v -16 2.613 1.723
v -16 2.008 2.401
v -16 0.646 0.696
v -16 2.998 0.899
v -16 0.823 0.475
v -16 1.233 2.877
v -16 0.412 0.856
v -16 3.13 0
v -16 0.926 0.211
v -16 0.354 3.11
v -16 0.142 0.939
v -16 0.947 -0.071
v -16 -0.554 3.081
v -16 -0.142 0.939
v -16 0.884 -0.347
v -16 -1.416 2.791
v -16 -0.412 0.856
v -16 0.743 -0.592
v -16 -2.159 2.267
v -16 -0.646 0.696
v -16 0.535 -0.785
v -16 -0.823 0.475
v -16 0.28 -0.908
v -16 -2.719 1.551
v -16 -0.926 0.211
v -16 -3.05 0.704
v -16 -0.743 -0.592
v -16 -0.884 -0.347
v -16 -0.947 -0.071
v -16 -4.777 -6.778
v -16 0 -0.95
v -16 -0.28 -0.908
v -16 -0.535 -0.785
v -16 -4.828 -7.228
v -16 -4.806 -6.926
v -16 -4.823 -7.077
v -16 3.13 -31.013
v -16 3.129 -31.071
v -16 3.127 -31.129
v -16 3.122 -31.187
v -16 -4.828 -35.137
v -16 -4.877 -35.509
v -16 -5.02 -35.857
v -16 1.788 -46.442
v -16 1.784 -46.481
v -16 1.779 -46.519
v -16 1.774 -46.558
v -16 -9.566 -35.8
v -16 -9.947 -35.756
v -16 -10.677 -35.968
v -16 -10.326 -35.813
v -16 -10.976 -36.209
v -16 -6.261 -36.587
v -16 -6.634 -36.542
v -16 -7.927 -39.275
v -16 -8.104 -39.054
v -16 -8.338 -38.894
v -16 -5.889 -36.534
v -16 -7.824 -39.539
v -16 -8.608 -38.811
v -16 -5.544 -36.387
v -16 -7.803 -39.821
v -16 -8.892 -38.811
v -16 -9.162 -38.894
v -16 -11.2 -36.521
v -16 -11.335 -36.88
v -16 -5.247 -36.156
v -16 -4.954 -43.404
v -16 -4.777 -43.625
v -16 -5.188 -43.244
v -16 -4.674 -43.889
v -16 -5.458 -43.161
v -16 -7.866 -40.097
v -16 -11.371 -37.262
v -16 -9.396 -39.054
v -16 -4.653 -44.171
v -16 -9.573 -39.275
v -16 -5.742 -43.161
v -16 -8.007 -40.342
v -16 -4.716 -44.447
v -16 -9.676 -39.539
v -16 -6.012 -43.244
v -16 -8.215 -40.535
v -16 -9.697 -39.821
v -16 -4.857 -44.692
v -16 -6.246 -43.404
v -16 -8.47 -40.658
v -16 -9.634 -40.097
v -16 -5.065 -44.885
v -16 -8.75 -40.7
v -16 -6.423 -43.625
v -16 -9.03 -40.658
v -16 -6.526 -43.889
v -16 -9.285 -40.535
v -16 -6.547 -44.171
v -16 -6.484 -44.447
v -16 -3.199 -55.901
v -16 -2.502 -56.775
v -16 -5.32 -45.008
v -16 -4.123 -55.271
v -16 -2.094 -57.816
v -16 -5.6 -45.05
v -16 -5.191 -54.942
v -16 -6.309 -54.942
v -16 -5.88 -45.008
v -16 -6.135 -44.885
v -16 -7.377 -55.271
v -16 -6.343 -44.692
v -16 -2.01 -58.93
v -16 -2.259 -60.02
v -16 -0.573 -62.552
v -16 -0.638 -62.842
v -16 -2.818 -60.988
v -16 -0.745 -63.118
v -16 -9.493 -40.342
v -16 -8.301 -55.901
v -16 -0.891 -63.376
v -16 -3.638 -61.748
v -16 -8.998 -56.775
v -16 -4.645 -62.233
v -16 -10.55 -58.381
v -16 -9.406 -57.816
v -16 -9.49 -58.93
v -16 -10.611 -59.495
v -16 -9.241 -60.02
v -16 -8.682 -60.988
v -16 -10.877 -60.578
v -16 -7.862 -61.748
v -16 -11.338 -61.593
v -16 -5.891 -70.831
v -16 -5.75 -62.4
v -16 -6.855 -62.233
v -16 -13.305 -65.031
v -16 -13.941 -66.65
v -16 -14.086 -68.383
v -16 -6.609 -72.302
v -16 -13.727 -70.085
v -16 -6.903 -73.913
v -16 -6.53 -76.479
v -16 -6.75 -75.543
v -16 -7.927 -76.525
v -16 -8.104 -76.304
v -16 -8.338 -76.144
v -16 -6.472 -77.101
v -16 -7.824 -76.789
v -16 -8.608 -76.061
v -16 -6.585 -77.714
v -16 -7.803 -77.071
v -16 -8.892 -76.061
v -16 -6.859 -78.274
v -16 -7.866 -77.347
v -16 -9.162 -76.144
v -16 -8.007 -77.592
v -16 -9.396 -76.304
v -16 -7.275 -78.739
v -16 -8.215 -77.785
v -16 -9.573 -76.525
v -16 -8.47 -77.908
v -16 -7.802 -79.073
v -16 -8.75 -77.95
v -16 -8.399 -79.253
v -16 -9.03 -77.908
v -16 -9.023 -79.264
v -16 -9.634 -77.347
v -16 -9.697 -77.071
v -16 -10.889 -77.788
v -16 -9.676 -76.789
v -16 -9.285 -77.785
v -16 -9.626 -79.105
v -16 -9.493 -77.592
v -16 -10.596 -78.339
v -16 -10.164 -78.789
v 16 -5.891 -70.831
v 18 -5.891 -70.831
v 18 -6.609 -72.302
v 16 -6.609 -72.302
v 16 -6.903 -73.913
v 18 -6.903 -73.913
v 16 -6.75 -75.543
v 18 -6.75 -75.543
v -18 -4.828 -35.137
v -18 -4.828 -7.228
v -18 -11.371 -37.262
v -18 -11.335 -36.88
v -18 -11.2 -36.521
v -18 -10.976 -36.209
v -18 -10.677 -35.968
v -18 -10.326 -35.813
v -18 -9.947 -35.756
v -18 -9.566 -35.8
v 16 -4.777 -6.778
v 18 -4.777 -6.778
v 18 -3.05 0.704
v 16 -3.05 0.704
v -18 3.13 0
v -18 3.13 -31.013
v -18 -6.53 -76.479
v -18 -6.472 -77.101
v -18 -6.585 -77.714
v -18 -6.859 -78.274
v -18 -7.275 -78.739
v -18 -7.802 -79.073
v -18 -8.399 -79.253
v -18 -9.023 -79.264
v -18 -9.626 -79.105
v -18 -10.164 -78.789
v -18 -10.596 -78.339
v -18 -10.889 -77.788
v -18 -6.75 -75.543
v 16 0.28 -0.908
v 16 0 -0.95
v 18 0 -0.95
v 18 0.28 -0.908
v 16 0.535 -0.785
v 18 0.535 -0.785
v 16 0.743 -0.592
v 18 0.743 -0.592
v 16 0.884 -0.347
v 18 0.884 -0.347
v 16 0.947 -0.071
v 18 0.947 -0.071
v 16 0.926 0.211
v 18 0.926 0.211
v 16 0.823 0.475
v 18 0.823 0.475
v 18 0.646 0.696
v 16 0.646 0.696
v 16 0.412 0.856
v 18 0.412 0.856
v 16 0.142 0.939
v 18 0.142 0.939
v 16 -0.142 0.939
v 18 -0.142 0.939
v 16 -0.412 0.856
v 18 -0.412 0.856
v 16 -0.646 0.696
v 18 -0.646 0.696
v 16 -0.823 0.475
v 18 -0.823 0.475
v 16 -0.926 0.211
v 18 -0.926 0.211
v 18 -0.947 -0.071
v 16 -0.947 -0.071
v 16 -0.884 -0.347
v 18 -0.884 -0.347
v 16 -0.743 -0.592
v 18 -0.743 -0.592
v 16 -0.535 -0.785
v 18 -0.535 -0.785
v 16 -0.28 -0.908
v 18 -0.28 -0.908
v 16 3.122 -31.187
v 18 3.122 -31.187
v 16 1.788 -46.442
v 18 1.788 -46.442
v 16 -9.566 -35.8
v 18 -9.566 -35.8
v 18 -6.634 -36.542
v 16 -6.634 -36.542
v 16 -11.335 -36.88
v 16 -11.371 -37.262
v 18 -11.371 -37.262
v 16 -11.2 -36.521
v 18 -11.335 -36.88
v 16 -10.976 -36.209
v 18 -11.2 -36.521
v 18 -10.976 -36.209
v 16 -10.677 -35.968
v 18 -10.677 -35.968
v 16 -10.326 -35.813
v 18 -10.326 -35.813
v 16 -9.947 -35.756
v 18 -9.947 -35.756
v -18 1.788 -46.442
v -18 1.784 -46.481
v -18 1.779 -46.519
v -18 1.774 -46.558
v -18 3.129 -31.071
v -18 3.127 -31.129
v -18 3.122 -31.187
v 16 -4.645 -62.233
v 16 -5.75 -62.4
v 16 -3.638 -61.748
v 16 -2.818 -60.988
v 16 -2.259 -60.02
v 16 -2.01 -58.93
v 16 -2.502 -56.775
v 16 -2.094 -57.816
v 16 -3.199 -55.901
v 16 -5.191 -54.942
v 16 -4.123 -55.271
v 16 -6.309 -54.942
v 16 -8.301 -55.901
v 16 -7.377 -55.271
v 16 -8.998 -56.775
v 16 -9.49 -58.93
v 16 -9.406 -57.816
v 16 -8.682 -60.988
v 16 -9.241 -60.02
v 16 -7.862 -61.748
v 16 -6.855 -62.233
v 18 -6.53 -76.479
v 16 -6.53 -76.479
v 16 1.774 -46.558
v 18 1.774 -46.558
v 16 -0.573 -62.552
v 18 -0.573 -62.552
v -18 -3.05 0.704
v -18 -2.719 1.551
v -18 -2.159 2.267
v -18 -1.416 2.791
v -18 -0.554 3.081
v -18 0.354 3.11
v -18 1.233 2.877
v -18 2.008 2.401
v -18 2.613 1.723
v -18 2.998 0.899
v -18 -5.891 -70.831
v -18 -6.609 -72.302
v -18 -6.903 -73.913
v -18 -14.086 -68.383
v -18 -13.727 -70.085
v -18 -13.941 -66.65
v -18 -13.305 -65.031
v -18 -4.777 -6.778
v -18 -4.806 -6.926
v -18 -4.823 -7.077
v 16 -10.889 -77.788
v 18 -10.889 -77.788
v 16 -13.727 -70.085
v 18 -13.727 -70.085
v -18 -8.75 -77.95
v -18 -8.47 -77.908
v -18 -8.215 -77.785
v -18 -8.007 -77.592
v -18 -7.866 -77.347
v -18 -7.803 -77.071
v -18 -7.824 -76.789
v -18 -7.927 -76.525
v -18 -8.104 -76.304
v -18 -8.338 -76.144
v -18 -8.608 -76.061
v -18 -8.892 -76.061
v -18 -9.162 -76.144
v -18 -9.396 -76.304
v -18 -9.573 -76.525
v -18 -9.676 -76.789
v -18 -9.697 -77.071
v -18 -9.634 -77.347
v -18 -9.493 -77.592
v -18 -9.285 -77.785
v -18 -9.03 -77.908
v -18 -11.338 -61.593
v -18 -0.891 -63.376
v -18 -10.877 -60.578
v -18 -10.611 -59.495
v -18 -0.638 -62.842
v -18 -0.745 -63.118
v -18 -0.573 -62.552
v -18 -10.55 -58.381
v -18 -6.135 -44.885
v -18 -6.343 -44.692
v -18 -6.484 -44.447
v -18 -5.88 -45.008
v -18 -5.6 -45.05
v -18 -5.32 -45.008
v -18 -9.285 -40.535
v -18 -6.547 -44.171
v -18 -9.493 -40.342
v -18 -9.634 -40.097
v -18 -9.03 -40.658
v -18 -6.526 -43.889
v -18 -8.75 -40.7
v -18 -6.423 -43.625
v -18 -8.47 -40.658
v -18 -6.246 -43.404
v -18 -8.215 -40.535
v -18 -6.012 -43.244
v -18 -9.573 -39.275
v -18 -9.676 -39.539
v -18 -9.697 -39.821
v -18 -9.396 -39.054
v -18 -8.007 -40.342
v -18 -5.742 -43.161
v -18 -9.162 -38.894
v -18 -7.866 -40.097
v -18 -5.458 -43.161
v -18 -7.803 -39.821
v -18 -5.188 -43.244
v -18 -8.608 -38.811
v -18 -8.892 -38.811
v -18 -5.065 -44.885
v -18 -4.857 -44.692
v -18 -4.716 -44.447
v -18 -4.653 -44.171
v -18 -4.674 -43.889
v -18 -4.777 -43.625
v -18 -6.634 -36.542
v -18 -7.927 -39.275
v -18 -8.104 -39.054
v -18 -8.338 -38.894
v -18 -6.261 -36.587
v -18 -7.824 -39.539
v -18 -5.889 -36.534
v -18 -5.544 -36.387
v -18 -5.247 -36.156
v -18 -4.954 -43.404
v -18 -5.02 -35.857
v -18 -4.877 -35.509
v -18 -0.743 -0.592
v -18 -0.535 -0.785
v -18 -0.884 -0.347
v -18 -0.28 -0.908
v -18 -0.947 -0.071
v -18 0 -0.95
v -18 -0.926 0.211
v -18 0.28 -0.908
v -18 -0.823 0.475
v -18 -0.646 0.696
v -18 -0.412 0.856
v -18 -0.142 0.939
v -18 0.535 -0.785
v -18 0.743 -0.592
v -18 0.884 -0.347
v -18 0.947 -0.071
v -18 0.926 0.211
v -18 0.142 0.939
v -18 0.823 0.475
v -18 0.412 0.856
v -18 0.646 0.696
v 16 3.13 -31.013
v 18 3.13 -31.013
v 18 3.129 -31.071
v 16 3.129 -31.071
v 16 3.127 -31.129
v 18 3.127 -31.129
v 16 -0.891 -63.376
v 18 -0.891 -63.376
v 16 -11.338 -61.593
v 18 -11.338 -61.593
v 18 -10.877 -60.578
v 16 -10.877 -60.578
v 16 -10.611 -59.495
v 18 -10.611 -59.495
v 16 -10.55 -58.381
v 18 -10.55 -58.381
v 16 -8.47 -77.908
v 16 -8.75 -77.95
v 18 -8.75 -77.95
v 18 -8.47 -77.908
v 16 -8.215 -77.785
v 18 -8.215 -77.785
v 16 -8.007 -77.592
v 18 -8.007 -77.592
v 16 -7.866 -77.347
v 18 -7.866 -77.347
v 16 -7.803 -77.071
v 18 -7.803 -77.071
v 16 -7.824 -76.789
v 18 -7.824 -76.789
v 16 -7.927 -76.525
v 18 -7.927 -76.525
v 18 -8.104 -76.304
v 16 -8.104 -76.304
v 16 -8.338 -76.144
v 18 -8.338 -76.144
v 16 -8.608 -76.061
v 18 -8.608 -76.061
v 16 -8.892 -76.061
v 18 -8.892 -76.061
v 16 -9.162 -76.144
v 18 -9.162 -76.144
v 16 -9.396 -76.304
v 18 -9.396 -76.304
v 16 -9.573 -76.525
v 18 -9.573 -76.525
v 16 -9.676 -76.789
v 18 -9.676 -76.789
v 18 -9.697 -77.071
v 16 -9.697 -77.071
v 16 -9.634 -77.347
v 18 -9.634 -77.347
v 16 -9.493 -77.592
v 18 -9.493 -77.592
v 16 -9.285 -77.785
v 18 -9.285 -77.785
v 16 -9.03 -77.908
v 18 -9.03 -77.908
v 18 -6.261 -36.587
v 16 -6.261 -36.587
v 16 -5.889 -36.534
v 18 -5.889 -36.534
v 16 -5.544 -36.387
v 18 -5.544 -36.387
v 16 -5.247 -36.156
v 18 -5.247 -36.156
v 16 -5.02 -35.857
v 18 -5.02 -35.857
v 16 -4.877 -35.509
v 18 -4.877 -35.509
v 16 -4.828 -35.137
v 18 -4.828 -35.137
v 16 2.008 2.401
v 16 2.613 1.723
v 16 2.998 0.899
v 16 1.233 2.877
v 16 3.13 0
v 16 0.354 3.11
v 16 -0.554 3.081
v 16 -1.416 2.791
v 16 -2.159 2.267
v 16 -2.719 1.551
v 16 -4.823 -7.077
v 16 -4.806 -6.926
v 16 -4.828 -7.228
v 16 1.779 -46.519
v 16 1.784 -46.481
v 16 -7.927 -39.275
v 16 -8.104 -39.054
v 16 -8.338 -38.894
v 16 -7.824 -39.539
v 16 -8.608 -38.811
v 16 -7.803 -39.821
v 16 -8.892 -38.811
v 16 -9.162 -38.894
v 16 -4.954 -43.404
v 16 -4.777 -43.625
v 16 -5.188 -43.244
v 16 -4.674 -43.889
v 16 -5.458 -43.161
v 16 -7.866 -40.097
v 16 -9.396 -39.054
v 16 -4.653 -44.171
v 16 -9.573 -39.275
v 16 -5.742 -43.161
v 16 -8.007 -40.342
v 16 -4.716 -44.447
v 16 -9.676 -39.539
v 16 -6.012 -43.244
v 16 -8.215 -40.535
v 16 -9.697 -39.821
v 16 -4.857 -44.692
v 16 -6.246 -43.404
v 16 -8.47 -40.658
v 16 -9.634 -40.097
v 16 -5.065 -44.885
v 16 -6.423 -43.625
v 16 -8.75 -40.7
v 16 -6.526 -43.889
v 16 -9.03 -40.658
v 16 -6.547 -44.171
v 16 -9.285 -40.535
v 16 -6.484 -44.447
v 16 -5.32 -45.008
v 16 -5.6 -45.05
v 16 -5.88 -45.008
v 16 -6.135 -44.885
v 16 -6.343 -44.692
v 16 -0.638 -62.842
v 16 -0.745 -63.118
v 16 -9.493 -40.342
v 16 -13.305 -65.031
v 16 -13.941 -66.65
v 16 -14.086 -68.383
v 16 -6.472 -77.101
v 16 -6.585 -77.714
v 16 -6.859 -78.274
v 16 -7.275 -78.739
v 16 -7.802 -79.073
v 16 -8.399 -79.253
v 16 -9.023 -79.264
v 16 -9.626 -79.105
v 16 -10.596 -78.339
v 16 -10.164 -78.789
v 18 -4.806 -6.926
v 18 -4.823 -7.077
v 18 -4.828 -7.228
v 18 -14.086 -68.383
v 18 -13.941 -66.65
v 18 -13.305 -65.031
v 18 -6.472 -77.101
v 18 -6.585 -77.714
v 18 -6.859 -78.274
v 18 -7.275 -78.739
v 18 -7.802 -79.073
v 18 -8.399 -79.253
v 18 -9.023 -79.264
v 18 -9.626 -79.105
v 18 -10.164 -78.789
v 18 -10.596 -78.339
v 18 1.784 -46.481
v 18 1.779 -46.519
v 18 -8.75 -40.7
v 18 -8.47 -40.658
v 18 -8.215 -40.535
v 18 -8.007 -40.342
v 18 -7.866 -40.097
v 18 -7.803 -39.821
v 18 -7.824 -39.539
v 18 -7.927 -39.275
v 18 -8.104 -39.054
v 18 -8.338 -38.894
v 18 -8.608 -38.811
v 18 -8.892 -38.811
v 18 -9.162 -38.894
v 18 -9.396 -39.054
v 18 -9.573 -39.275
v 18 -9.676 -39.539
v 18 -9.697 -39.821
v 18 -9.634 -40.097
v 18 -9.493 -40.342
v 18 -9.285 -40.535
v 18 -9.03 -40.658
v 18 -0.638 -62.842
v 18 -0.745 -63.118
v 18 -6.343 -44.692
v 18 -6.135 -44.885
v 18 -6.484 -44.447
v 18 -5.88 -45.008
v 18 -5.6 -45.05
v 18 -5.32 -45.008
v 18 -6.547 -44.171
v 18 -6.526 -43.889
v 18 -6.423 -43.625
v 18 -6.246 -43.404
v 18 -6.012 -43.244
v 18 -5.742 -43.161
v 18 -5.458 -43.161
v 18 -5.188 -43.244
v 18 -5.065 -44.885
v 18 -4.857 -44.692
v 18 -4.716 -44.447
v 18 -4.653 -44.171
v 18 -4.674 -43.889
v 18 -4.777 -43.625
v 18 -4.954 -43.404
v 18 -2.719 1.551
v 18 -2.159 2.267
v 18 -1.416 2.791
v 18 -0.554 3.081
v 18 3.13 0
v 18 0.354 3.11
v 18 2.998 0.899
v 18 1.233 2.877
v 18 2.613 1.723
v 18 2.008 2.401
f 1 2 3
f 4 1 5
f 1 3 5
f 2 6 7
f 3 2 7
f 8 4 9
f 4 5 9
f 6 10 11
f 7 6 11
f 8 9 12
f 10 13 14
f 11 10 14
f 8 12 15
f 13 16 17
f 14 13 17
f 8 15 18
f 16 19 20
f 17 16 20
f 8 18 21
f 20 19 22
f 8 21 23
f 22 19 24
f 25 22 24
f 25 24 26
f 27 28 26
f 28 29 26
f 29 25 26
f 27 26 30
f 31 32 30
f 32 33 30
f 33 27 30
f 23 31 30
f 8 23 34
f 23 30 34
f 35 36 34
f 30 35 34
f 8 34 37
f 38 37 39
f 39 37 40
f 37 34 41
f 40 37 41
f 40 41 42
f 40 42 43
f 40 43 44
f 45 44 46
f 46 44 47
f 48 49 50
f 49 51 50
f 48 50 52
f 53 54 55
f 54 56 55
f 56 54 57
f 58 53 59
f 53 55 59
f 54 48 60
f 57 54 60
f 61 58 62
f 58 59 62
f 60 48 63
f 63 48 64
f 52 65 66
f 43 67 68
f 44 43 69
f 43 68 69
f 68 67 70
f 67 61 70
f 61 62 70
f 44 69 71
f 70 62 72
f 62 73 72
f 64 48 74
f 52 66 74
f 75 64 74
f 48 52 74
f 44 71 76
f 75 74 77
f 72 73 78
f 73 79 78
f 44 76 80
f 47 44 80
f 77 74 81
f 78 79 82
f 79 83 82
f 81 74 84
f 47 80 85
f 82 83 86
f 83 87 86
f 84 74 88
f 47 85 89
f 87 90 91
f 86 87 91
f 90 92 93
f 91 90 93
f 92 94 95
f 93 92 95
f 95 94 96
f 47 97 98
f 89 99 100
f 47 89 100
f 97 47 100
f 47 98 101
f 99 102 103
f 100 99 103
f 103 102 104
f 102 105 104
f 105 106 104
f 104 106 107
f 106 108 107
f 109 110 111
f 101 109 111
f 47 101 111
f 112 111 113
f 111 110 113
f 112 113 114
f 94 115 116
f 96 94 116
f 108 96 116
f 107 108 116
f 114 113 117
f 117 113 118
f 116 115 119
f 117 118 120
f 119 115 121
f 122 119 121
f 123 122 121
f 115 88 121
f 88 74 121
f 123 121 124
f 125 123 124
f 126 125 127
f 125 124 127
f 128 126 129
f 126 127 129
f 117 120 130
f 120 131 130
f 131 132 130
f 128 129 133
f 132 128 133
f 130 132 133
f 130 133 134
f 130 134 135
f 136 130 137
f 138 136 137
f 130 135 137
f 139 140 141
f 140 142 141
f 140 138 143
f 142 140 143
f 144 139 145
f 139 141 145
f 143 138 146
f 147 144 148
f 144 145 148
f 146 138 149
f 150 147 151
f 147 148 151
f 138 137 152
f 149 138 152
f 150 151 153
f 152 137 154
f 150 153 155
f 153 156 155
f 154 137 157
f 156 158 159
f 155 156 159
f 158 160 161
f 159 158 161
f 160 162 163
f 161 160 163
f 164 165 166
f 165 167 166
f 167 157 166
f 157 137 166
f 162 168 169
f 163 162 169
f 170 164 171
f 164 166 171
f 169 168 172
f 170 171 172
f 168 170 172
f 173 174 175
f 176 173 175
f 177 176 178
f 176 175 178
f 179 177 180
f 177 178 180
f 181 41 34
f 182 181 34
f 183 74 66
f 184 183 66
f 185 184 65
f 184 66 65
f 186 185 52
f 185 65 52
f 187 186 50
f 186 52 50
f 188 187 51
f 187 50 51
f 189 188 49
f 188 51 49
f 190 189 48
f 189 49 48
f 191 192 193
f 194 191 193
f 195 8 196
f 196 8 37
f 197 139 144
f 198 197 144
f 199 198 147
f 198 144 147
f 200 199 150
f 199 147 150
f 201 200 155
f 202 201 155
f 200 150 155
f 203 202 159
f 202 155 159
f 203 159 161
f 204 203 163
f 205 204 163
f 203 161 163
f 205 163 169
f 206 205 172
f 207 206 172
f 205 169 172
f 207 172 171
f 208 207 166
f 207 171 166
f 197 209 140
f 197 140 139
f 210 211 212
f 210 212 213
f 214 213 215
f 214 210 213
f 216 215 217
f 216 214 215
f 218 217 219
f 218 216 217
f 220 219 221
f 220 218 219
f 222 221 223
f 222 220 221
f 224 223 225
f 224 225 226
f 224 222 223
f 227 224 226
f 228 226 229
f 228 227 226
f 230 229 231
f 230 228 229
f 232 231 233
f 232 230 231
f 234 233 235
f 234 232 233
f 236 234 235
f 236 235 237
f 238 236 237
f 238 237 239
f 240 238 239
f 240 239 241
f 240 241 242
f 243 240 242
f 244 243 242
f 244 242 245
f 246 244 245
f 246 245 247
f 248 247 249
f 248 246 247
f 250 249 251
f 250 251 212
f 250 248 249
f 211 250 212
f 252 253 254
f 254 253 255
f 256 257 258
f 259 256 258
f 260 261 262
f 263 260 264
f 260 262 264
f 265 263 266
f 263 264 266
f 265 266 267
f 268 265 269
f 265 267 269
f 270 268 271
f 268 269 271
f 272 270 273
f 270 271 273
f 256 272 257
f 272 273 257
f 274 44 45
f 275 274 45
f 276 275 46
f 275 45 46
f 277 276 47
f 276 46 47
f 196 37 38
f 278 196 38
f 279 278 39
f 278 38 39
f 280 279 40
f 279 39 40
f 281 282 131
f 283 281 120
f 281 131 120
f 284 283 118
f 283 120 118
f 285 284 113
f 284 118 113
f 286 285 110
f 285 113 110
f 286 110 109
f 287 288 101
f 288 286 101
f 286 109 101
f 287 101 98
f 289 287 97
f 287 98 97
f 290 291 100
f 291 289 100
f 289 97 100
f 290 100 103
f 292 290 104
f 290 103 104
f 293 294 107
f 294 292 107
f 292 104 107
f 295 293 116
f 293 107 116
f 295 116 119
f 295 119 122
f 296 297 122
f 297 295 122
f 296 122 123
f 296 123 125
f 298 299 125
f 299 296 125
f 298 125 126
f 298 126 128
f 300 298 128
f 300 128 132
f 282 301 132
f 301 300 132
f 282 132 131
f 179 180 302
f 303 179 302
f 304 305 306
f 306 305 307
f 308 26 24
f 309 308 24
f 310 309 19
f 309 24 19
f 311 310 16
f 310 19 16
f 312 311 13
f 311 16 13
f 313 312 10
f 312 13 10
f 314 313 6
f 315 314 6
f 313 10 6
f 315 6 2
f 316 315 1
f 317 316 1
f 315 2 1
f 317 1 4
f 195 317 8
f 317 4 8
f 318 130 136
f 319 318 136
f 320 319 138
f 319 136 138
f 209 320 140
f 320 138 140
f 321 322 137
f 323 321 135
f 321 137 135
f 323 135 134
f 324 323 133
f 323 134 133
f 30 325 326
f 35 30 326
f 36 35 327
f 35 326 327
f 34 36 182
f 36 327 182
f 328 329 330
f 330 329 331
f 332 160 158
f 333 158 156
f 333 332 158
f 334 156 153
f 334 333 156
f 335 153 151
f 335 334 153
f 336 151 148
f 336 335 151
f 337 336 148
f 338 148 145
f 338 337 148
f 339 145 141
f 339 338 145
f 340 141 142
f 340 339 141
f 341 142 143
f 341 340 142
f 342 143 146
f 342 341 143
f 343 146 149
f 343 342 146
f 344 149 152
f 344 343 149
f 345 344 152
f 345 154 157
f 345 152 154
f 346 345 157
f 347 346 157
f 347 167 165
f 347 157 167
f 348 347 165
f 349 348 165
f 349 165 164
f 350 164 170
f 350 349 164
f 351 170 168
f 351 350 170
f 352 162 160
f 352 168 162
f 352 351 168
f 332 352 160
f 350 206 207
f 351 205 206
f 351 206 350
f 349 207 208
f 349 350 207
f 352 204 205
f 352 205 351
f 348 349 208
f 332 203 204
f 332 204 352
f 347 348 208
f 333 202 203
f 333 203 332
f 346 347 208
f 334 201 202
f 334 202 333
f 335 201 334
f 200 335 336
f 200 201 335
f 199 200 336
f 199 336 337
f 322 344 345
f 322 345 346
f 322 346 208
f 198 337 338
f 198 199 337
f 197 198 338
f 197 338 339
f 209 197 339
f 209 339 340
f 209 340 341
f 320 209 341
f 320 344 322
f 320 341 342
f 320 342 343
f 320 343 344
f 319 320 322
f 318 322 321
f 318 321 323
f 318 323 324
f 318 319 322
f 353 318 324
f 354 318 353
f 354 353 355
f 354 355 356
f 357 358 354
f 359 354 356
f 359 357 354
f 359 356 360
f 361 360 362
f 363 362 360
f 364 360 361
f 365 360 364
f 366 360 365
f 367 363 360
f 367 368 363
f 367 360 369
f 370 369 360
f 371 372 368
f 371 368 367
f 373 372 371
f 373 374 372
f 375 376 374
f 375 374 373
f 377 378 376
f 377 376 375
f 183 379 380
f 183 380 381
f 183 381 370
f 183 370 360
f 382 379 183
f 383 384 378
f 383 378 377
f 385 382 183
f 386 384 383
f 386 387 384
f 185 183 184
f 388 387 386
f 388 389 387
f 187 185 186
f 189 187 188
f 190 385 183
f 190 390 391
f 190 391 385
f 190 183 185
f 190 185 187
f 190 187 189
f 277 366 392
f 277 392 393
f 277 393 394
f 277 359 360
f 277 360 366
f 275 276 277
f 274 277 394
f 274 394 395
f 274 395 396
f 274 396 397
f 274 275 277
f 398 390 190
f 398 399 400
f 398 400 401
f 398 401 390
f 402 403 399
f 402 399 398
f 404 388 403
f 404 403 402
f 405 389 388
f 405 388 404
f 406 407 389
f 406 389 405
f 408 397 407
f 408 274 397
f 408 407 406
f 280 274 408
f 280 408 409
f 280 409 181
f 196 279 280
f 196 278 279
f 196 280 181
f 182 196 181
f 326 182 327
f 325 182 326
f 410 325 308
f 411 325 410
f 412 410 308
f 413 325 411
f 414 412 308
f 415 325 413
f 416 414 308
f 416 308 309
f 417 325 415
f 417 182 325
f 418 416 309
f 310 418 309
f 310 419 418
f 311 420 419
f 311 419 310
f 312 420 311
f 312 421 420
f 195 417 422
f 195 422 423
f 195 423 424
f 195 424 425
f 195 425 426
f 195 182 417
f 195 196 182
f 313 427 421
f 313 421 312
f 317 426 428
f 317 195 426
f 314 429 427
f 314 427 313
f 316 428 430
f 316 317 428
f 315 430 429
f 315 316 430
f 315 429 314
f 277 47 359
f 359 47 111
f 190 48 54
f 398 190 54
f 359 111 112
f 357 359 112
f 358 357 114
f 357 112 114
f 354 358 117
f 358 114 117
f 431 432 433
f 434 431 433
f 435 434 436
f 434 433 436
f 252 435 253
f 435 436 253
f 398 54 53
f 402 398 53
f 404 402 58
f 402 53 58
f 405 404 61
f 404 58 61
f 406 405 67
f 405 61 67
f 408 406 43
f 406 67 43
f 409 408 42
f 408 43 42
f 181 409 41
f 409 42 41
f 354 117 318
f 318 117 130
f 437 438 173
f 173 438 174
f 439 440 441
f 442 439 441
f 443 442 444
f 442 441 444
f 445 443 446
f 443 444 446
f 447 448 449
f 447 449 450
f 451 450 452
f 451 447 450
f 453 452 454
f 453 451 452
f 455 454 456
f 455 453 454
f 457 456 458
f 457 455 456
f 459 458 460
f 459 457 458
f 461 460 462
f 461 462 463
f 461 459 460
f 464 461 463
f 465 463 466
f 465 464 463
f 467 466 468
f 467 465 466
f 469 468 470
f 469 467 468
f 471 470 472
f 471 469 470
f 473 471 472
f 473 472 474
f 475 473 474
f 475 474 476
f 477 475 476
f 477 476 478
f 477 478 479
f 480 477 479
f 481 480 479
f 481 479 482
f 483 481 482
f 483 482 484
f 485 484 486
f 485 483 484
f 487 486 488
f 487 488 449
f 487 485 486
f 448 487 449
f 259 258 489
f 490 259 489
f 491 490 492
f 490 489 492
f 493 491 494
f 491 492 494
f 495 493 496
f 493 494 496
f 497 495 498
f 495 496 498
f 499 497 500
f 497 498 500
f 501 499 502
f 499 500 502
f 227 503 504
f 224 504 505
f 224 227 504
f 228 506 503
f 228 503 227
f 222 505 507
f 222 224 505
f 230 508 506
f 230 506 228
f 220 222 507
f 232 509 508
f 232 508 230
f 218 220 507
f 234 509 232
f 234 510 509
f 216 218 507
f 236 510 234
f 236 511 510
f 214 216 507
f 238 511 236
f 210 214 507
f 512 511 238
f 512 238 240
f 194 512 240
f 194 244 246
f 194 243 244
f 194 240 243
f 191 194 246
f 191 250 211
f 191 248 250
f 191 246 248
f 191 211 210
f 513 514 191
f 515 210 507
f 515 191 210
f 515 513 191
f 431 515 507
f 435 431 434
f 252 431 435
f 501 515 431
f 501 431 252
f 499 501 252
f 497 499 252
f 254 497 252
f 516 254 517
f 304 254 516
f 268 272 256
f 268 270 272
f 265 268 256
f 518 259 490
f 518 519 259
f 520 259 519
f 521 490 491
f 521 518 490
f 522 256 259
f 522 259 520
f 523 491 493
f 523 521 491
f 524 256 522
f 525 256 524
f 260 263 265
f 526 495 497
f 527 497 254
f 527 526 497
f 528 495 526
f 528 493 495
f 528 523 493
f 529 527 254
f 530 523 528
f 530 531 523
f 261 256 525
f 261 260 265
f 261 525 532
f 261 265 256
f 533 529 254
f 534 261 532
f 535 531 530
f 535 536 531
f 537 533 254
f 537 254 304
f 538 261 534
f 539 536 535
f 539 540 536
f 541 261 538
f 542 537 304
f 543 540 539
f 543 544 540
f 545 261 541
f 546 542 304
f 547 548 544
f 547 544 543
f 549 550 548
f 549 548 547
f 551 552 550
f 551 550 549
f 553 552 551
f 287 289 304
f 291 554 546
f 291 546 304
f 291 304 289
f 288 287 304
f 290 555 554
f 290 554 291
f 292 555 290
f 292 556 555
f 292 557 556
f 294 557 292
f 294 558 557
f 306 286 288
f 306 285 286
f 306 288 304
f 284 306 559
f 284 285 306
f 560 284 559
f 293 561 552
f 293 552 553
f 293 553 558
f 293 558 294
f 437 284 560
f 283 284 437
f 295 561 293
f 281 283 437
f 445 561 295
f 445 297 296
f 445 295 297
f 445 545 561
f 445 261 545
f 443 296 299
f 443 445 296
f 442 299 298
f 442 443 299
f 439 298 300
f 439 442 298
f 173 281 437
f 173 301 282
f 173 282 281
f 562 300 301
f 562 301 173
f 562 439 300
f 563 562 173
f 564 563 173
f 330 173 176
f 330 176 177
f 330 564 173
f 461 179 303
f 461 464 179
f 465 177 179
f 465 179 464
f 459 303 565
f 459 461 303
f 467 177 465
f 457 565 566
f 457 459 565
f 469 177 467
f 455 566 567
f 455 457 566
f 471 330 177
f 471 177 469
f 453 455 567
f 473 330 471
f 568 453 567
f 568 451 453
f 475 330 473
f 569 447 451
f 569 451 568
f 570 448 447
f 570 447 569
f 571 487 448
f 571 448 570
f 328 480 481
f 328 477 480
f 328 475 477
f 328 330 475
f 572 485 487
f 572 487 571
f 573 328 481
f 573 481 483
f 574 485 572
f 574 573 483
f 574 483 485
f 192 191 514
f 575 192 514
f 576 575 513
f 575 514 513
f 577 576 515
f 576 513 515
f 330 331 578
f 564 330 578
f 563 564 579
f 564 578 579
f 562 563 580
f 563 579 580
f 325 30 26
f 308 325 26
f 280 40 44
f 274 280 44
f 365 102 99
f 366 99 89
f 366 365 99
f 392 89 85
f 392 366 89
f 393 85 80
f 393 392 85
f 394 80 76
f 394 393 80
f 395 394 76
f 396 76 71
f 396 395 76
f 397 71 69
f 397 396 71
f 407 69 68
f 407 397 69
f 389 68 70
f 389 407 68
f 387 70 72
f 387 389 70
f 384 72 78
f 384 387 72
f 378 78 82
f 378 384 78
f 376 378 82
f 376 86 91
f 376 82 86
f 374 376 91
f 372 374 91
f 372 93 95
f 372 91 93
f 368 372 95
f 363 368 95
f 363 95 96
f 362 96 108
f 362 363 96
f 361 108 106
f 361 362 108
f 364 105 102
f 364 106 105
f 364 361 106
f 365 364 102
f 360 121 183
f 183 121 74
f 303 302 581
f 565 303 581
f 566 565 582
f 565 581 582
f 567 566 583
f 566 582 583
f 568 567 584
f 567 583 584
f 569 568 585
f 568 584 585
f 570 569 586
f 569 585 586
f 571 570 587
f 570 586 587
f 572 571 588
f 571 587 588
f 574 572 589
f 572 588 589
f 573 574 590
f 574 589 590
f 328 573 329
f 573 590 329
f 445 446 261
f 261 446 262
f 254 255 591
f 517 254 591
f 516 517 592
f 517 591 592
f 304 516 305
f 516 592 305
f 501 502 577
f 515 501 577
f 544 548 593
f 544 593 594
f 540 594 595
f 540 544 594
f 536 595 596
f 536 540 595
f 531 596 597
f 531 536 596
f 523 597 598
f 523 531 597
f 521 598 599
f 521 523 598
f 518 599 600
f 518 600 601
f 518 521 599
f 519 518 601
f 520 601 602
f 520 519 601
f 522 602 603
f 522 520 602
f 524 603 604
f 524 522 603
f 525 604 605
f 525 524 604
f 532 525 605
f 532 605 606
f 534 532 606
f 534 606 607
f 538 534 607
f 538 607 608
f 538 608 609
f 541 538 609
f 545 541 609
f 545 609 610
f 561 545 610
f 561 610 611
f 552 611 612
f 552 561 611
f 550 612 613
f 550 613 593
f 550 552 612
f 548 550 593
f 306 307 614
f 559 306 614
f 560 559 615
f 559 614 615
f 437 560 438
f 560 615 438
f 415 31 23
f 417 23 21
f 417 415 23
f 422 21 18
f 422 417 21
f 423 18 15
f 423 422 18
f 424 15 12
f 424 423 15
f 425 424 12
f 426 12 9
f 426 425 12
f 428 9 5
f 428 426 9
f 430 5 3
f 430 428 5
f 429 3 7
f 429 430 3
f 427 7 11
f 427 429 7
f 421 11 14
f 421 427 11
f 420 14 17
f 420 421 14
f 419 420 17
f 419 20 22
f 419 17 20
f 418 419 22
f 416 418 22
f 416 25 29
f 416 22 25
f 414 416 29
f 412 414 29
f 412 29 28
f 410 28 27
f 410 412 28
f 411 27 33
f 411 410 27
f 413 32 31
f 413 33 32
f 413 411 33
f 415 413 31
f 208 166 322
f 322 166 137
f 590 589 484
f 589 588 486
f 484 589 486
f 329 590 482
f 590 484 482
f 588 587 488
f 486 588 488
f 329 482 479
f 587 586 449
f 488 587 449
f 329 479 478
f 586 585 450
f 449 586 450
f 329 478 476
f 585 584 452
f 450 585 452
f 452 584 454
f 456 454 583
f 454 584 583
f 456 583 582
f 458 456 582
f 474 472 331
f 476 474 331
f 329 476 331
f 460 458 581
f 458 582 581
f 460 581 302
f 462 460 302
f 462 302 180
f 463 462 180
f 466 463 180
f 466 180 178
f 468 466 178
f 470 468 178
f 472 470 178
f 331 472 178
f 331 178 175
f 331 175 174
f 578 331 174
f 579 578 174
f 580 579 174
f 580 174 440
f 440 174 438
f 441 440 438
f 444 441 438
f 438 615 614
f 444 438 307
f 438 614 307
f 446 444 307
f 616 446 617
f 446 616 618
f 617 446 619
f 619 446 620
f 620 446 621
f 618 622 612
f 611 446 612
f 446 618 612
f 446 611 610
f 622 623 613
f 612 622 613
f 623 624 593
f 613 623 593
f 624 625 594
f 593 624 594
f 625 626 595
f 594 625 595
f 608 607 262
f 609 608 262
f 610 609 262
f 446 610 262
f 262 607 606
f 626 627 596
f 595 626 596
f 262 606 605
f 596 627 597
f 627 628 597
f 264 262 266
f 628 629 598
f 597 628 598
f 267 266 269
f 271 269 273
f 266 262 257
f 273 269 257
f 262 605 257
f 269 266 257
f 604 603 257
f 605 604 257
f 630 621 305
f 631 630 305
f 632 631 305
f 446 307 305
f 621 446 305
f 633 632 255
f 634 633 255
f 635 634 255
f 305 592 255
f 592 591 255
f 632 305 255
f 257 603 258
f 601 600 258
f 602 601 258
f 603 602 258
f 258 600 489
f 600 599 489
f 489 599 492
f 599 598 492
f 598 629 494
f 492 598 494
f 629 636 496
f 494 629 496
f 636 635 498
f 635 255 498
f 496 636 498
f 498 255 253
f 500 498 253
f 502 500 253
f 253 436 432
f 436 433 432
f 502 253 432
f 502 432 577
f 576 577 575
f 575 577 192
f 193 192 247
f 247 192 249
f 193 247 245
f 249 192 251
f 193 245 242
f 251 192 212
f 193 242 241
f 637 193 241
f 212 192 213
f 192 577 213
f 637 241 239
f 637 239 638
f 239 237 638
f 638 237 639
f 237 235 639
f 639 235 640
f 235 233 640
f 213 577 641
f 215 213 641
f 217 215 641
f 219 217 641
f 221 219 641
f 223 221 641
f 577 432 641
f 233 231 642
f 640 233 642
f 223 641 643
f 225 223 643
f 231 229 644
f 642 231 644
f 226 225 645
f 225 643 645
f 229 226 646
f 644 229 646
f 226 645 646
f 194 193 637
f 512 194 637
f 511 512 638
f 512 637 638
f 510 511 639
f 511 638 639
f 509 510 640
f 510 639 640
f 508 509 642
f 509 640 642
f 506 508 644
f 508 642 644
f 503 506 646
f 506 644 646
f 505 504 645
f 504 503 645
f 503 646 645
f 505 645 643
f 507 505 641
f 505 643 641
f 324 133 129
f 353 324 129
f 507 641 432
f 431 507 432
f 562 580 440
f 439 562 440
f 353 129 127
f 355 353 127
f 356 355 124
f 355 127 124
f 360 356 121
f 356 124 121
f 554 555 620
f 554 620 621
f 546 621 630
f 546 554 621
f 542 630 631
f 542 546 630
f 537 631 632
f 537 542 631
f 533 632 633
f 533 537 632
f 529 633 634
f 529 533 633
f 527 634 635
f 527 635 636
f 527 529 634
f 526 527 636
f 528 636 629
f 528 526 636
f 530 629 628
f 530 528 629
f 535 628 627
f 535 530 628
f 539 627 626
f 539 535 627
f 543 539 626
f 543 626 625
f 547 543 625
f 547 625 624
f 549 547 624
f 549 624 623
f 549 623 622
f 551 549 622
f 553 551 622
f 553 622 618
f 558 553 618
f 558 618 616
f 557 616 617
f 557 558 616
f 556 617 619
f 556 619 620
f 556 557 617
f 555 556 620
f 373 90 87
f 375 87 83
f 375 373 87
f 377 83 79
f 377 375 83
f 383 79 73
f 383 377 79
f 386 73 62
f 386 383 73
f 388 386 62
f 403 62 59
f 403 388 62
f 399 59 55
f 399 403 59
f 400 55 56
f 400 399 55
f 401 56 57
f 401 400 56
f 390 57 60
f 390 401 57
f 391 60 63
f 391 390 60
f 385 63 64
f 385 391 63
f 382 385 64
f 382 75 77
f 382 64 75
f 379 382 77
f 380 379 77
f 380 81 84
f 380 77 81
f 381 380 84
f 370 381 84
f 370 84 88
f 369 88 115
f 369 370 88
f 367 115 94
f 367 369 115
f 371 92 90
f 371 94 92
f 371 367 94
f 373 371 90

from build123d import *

# Parameters (mm, degrees)
SKETCH1_R                = 0.95
BOSS_EXTRUDE1_DEPTH      = 18
FILLET1_R                = 2
CUT_EXTRUDE1_DEPTH       = 83.510909783
CUT_EXTRUDE1_DEPTH_BACK  = 83.510909783
SKETCH2_W                = 32
SKETCH2_H                = 82.41
BOSS_EXTRUDE2_DEPTH      = 18
BOSS_EXTRUDE2_DEPTH_BACK = 16
SKETCH3_R                = 3.75


with BuildPart() as part:
    # Sketch1 → Boss-Extrude1 (new, symmetric)
    with BuildSketch(Plane(origin=(0, 0, 0), x_dir=(0, 0, -1), z_dir=(1, 0, 0))):
        with BuildLine():
            Line((0, 3.13), (31.1, 3.13))
            Line((31.1, 3.13), (46.5, 1.782674582))
            Line((46.5, 1.782674582), (63, -0.639122384))
            Line((63, -0.639122384), (70.830854785, -5.891324783))
            ThreePointArc((70.830854785, -5.891324783), (73.097482442, -6.811154728), (75.542872081, -6.749855612))
            Line((75.542872081, -6.749855612), (76.479440337, -6.530221264))
            ThreePointArc((76.479440337, -6.530221264), (79.183707452, -8.094392066), (77.788191978, -10.889428289))
            Line((77.788191978, -10.889428289), (70.085210842, -13.7273023))
            ThreePointArc((70.085210842, -13.7273023), (67.51150317, -14.076398492), (65.031397439, -13.305091226))
            Line((65.031397439, -13.305091226), (61.593330792, -11.338037731))
            ThreePointArc((61.593330792, -11.338037731), (60.042423522, -10.718485849), (58.380824128, -10.550422334))
            Line((58.380824128, -10.550422334), (37.261773194, -11.370750671))
            ThreePointArc((37.261773194, -11.370750671), (36.078702039, -10.834444885), (35.799894202, -9.565765476))
            Line((35.799894202, -9.565765476), (36.542469609, -6.634487021))
            ThreePointArc((36.542469609, -6.634487021), (36.281163577, -5.387851181), (35.136870597, -4.828409195))
            Line((35.136870597, -4.828409195), (7, -4.828409195))
            Line((7, -4.828409195), (-0.7040968, -3.049778303))
            ThreePointArc((-0.7040968, -3.049778303), (-3.109879908, 0.354326059), (0, 3.13))
        make_face()
        Circle(SKETCH1_R, mode=Mode.SUBTRACT)
        with Locations((44.1, -5.6)):
            Circle(SKETCH1_R, mode=Mode.SUBTRACT)
        with Locations((39.75, -8.75)):
            Circle(SKETCH1_R, mode=Mode.SUBTRACT)
        with Locations((77, -8.75)):
            Circle(SKETCH1_R, mode=Mode.SUBTRACT)
    extrude(amount=BOSS_EXTRUDE1_DEPTH, both=True)

    # Fillet1
    # the kernel refuses this fillet: 2 mm, written as the material it takes off along each edge
    with BuildSketch(Plane(origin=(19.131384491, -0.639122384, -63), x_dir=(0, -0.557020574337694, -0.8304986934152909), z_dir=(-1, 0, 0))) as fillet1_piece_1:
        with BuildLine():
            CenterArc((FILLET1_R * 0.226276898255, FILLET1_R), FILLET1_R, 244.5, 25.5)
            Line((-FILLET1_R * 0.204234198553, FILLET1_R * 0.0974147156501), (0, 0))
            Line((0, 0), (FILLET1_R * 0.226276898255, 0))
        make_face()
    extrude(amount=38.262768983, mode=Mode.SUBTRACT)
    with BuildSketch(Plane(origin=(-18.569678042, -4.828409195, -7), x_dir=(0, 0.22495105434386356, 0.9743700647852356), z_dir=(1, 0, 0))) as fillet1_piece_2:
        with BuildLine():
            CenterArc((FILLET1_R * 0.113935608302, -FILLET1_R), FILLET1_R, 90, 13)
            Line((-FILLET1_R * 0.111015446042, -FILLET1_R * 0.0256299352148), (0, 0))
            Line((0, 0), (FILLET1_R * 0.113935608302, 0))
        make_face()
    extrude(amount=37.139356083, mode=Mode.SUBTRACT)
    with BuildSketch(Plane(origin=(18.218304715, 3.13, -31.1), x_dir=(0, 0, 1), z_dir=(-1, 0, 0))) as fillet1_piece_3:
        with BuildLine():
            CenterArc((FILLET1_R * 0.0436609429085, -FILLET1_R), FILLET1_R, 90, 5)
            Line((-FILLET1_R * 0.0434947998391, -FILLET1_R * 0.00380530190825), (0, 0))
            Line((0, 0), (FILLET1_R * 0.0436609429085, 0))
        make_face()
    extrude(amount=36.436609429, mode=Mode.SUBTRACT)
    with BuildSketch(Plane(origin=(18.14621298, 1.782674582, -46.5), x_dir=(0, -0.14521967007723557, -0.9893994377513355), z_dir=(-1, 0, 0))) as fillet1_piece_4:
        with BuildLine():
            CenterArc((FILLET1_R * 0.0292425960983, FILLET1_R), FILLET1_R, 266.65, 3.35)
            Line((-FILLET1_R * 0.02919262642, FILLET1_R * 0.00170879761001), (0, 0))
            Line((0, 0), (FILLET1_R * 0.0292425960983, 0))
        make_face()
    extrude(amount=36.292425961, mode=Mode.SUBTRACT)

    # Sketch2 → Cut-Extrude1 (cut, two sides: drawn at the far end of the back side and taken through both)
    with BuildSketch(Plane(origin=(0, 0, 0), x_dir=(1, 0, 0), z_dir=(0, 1, 0)).offset(-CUT_EXTRUDE1_DEPTH_BACK)):
        with Locations((0, 38.075)):
            Rectangle(SKETCH2_W, SKETCH2_H)
    extrude(amount=CUT_EXTRUDE1_DEPTH + CUT_EXTRUDE1_DEPTH_BACK, mode=Mode.SUBTRACT)


with BuildPart() as cut_extrude1_piece_1:
    # of the separate pieces the step leaves, piece 1, a body of its own (cut_extrude1_pieces)
    add(part.part.solids().sort_by_distance((16, 3.13, 0))[0])



with BuildPart() as cut_extrude1_piece_2:
    # of the separate pieces the step leaves, piece 2, a body of its own (cut_extrude1_pieces)
    add(part.part.solids().sort_by_distance((-18, 3.13, 0))[0])


with BuildPart() as cut_extrude1_piece_1_1:
    add(cut_extrude1_piece_1.part)

    add(cut_extrude1_piece_2.part)  # Boss-Extrude2 merges Cut-Extrude1 piece 2
    # Sketch3 → Boss-Extrude2 (add, two sides: drawn at the far end of the back side and taken through both)
    with BuildSketch(Plane(origin=(0, 0, 0), x_dir=(0, 0, -1), z_dir=(1, 0, 0)).offset(-BOSS_EXTRUDE2_DEPTH_BACK)):
        with Locations((58.65, -5.75)):
            Circle(SKETCH3_R)
    extrude(amount=BOSS_EXTRUDE2_DEPTH + BOSS_EXTRUDE2_DEPTH_BACK)


solid = cut_extrude1_piece_1_1.part
